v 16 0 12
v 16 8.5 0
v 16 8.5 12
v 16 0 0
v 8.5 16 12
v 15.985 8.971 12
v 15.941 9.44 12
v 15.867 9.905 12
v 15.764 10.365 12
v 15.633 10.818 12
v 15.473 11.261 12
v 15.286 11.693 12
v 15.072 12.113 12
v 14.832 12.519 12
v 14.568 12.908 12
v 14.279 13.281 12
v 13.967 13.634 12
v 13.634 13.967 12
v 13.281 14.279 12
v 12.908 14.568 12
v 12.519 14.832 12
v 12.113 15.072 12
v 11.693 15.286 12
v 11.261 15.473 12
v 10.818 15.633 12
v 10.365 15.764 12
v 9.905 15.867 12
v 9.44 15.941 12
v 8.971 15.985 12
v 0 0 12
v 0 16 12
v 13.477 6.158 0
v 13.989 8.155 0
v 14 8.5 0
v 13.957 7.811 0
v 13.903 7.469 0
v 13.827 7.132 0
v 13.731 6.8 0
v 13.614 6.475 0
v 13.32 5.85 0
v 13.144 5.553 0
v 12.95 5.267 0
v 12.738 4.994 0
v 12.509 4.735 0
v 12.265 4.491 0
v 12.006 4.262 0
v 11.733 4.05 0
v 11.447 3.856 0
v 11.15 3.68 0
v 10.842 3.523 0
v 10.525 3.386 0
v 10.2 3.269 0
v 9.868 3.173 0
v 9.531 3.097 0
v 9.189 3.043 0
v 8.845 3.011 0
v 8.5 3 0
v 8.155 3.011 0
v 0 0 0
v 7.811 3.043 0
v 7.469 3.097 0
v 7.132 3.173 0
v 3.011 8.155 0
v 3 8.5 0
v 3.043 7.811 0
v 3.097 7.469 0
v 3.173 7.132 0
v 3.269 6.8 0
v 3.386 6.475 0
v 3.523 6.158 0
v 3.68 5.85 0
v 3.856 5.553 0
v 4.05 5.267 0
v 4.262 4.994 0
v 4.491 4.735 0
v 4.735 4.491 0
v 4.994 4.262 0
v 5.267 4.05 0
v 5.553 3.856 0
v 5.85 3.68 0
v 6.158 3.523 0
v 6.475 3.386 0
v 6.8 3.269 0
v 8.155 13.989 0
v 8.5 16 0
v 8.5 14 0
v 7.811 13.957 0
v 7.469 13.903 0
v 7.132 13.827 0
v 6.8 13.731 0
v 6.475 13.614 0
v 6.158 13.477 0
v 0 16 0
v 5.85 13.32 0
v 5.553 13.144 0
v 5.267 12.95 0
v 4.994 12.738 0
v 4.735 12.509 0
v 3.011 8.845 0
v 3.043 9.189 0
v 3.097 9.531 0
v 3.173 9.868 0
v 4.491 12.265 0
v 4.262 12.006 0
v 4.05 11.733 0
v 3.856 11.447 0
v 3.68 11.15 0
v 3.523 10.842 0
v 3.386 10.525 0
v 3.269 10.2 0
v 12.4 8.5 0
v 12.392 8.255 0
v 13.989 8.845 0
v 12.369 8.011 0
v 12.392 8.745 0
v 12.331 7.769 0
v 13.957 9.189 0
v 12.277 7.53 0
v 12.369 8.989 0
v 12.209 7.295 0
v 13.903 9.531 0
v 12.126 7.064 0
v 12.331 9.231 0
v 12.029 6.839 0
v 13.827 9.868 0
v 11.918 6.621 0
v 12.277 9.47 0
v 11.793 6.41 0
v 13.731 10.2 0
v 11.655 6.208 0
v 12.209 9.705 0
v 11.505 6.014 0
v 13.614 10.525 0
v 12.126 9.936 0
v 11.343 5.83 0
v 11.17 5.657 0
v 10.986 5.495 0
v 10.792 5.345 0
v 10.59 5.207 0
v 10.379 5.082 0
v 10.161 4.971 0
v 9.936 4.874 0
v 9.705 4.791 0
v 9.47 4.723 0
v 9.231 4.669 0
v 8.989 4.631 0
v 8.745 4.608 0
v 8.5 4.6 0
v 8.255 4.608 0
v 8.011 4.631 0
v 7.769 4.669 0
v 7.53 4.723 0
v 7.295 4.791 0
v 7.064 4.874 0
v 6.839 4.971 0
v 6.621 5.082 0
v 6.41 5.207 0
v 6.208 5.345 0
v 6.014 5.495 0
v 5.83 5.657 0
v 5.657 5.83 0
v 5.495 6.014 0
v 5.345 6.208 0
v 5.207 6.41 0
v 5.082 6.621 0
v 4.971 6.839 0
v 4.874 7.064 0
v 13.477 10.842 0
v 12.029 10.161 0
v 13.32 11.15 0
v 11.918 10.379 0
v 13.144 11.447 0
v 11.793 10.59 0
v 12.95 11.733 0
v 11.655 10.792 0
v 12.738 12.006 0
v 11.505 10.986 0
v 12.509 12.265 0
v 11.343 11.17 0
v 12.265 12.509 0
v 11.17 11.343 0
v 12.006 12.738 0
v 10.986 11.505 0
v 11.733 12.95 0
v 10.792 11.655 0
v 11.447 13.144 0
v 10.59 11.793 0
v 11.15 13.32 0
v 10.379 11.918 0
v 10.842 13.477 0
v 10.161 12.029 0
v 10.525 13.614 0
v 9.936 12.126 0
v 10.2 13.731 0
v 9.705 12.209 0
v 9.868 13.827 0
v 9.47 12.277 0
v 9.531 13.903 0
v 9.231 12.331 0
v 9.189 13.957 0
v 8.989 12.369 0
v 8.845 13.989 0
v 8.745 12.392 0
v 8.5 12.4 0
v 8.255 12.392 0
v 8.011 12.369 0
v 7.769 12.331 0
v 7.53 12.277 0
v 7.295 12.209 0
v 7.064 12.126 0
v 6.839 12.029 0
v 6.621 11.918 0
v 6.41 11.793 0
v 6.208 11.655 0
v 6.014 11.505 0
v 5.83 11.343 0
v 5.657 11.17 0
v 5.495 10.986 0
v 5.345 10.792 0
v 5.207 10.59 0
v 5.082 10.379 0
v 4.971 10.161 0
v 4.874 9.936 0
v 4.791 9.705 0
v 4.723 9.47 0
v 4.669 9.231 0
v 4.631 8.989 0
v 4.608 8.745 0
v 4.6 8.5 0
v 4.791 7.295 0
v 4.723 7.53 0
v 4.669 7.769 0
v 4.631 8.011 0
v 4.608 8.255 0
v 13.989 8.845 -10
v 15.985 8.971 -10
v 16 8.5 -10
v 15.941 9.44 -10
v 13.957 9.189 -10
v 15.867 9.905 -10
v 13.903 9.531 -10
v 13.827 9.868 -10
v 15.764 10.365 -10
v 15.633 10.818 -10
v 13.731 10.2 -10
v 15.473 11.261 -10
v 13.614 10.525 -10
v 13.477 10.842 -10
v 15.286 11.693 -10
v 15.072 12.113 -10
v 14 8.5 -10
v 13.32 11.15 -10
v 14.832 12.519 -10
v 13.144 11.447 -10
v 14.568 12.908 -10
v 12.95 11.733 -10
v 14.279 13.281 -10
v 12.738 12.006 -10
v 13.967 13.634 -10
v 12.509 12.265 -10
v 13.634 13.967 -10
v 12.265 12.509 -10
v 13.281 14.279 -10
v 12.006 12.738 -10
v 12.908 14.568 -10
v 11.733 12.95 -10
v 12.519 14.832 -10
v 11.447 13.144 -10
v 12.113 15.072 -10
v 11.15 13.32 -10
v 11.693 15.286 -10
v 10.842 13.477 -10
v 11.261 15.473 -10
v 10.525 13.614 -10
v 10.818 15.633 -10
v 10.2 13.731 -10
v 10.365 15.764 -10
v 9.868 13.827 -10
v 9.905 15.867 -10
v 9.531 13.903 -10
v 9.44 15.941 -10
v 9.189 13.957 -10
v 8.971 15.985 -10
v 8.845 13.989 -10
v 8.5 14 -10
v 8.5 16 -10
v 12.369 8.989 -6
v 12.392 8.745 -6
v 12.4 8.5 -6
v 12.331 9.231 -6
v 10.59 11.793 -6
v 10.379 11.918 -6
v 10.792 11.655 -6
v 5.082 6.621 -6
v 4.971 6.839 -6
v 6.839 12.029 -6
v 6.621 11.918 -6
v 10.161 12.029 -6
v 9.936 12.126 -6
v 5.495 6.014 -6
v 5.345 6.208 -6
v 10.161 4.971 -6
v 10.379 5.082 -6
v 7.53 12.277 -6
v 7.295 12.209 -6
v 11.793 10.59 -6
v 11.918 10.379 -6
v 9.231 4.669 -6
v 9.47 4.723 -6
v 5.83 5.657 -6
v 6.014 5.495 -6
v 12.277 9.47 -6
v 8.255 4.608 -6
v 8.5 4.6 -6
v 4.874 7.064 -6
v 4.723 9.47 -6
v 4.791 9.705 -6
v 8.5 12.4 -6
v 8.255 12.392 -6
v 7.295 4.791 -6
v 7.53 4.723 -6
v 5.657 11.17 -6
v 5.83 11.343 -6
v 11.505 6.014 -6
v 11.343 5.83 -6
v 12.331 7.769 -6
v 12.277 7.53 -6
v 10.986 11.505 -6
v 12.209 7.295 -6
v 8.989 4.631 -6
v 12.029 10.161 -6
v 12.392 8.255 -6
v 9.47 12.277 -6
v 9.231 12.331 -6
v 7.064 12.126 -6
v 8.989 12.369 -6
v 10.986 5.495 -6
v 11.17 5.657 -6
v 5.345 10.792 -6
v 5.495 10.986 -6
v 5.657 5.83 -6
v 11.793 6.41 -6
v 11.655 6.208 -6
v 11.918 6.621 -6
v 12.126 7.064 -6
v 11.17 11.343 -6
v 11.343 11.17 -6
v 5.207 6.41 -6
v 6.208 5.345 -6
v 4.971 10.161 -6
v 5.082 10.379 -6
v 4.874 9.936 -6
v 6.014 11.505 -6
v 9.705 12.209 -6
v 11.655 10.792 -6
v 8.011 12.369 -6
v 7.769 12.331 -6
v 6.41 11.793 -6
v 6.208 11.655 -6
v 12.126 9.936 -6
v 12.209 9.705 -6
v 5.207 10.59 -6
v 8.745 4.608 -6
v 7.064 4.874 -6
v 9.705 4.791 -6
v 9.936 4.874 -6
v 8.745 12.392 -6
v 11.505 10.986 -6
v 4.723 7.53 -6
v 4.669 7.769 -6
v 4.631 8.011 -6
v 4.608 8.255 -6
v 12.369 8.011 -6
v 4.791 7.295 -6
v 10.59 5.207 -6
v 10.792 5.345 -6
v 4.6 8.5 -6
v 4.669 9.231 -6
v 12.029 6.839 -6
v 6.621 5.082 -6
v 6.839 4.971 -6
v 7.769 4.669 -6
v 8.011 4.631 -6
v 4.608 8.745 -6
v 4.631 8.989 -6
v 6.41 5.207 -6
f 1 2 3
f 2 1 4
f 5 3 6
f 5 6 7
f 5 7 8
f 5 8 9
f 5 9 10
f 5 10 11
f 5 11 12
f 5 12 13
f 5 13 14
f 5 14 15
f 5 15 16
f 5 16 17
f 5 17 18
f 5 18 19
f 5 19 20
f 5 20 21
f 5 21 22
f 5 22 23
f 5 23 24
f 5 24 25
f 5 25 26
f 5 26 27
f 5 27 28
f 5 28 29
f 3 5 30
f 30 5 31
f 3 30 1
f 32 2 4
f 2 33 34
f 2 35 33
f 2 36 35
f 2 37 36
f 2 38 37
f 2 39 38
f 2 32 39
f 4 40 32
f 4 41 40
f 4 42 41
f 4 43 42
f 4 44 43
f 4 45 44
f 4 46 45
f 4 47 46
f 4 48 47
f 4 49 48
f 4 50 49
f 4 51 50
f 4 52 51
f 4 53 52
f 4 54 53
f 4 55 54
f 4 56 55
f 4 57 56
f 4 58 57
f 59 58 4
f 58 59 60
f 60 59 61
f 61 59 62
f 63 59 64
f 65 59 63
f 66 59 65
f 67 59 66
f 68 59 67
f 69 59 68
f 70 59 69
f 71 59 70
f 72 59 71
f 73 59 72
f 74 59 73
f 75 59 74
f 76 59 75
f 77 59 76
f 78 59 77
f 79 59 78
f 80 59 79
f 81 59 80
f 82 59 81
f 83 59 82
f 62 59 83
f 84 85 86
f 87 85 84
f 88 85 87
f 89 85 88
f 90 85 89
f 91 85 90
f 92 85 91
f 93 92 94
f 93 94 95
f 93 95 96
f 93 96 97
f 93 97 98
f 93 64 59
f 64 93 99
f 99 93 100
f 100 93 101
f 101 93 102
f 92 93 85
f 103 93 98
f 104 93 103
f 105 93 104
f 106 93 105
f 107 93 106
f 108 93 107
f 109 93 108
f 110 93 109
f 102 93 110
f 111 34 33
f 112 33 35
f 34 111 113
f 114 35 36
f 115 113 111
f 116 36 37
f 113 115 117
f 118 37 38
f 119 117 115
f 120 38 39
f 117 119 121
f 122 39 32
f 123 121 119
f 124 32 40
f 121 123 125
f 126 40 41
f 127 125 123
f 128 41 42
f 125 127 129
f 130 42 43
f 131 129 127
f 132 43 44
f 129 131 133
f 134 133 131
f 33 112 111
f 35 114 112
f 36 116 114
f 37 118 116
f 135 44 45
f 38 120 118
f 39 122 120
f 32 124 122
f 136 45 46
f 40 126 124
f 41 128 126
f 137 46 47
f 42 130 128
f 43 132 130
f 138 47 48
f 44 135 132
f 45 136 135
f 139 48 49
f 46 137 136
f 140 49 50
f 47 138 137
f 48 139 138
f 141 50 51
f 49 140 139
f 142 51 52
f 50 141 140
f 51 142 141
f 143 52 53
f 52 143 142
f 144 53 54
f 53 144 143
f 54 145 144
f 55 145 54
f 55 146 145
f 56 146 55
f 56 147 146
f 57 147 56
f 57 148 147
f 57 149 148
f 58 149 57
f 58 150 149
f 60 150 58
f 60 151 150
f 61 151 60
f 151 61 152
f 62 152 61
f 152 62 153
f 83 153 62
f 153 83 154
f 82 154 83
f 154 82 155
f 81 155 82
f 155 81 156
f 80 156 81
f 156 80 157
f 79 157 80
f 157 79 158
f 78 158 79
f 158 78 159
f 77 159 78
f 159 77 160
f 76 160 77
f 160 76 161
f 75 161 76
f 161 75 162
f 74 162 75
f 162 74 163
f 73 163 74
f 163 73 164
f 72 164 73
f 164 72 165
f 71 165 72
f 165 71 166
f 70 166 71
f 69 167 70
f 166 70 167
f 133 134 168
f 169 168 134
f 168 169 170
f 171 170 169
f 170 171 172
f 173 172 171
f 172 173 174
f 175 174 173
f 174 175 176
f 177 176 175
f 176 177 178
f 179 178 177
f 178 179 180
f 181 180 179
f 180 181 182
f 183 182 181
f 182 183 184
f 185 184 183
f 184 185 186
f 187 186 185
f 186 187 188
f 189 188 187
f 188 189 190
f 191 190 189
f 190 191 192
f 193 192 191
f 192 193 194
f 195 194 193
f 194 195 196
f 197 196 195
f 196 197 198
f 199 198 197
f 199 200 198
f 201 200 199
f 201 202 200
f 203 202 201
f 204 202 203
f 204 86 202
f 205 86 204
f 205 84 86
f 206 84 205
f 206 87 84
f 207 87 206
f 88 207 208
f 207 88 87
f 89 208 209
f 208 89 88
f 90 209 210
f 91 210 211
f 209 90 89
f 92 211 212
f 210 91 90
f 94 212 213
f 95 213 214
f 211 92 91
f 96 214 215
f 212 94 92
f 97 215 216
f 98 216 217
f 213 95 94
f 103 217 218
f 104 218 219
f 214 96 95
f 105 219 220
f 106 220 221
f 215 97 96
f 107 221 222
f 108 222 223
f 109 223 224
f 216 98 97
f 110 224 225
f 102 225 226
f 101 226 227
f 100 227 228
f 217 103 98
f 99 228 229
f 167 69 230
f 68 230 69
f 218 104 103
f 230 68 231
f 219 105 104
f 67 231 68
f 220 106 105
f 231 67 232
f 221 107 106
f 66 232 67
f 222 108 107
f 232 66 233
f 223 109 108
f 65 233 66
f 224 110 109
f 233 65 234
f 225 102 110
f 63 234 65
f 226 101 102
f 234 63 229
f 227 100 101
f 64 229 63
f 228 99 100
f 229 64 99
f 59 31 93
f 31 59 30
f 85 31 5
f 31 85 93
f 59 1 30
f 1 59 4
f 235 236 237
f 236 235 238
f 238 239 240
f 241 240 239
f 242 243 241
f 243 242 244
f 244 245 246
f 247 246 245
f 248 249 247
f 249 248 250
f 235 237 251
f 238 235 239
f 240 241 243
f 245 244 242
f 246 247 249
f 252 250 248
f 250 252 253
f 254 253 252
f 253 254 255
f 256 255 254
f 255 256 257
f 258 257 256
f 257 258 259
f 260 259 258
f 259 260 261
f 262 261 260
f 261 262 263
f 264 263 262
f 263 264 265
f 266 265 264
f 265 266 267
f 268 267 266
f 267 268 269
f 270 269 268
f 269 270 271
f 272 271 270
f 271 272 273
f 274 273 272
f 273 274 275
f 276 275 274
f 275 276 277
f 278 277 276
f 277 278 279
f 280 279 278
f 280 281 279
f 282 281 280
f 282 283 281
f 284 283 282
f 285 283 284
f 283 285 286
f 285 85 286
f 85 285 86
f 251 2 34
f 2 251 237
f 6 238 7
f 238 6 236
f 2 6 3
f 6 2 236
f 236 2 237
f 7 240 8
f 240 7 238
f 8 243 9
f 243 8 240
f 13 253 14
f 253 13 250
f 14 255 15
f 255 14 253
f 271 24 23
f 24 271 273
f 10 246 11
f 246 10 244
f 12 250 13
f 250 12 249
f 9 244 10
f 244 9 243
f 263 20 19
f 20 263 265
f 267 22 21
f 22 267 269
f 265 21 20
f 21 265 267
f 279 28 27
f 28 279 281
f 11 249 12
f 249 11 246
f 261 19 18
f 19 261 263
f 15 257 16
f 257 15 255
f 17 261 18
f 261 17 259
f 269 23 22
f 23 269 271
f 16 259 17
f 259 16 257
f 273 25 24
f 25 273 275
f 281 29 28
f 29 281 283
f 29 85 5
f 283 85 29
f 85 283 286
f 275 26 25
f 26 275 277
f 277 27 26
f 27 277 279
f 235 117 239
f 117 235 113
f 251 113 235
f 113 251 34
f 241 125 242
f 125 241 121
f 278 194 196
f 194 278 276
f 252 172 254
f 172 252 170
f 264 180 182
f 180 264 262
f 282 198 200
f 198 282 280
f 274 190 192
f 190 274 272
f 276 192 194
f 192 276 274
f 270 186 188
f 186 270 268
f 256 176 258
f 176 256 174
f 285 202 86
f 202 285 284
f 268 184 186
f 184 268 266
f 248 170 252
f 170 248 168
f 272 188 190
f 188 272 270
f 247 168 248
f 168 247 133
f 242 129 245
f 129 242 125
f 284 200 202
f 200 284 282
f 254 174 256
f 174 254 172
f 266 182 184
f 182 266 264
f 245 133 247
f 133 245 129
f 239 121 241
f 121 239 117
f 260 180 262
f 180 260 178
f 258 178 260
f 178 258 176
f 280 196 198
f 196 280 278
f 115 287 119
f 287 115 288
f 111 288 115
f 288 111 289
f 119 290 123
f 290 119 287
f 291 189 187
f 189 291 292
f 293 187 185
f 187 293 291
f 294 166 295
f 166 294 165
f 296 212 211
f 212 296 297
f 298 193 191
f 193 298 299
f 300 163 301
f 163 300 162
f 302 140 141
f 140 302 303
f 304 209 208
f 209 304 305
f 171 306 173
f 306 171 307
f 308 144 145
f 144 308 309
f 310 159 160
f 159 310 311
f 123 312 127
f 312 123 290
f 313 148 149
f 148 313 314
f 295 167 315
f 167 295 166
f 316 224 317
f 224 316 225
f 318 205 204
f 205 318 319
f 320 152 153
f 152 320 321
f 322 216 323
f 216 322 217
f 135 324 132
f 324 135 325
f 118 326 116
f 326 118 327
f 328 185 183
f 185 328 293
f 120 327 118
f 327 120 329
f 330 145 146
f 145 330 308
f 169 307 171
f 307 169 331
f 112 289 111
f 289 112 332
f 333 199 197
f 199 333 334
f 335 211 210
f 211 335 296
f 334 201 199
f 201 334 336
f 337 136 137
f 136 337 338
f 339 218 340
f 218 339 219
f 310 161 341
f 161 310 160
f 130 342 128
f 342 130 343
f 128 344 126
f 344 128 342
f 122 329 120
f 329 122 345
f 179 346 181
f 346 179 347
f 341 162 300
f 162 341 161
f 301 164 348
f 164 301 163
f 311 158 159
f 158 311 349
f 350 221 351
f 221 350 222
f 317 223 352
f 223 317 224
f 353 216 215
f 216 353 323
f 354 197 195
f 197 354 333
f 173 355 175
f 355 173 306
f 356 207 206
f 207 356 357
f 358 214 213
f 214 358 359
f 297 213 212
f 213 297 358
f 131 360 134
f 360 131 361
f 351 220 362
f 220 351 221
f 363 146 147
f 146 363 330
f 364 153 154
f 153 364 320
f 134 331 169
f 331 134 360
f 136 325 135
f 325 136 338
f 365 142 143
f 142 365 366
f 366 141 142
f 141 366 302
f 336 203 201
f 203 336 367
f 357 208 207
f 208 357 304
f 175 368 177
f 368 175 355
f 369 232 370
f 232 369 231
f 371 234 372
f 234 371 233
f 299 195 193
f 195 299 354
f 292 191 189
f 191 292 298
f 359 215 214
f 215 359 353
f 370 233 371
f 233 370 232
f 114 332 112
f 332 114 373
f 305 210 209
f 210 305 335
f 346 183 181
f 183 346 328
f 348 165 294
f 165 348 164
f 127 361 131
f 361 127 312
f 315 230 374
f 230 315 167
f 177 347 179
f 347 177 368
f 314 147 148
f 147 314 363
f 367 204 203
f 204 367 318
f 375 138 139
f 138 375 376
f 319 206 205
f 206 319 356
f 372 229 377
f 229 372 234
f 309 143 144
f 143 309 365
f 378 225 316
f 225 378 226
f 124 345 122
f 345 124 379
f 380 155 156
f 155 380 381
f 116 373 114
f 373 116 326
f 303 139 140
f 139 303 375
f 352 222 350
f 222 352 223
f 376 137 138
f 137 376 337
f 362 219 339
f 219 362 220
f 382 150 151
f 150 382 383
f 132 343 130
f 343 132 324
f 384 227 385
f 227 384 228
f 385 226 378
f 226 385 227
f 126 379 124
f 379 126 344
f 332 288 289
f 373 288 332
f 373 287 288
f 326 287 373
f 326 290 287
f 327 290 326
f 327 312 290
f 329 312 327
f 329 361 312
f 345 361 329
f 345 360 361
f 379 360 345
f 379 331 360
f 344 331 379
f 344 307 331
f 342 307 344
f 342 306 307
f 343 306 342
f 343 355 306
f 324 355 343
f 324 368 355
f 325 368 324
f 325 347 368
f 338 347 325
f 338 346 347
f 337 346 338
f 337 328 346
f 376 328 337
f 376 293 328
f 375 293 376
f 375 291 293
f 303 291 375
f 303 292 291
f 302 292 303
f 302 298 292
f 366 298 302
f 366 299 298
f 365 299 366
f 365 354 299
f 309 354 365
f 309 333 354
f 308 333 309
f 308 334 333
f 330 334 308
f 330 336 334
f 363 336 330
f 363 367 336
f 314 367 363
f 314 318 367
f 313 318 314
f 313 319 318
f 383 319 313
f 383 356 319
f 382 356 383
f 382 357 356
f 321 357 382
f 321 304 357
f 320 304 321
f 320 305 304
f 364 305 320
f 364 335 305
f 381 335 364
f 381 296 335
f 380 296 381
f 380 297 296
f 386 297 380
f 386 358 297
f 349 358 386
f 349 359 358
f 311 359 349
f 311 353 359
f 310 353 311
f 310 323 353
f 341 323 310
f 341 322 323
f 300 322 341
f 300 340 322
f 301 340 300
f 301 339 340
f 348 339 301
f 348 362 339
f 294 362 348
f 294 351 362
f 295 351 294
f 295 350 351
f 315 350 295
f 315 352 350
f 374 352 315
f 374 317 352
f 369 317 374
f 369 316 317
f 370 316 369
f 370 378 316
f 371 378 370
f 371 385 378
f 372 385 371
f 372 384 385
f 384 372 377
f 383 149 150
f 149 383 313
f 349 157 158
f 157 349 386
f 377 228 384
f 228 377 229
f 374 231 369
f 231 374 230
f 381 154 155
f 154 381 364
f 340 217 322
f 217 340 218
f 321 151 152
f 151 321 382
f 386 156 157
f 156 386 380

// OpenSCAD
$fn=100;
cornerSize=14;
screwHoleR=8 / 2;
screwHoleDepth=6;
outerDepth=10;
outerR=screwHoleR + 1.5;
buttonClearance=12;
outerEdge=2;

module inverseCorner(r=8,h=10) {
    difference() {
        translate([0,0,0]) {
            cube([r, r, h]);
        }
        translate([0,0,-0.001]) {
            cylinder(r=r,h=h + 0.002);
        }
    }
}

//inverseCorner();


difference() {
    union() {
        cube([cornerSize + outerEdge, cornerSize + outerEdge, buttonClearance]);
        translate([cornerSize - outerR, cornerSize - outerR, -outerDepth]) {
            cube([ outerR + outerEdge, outerR + outerEdge, outerDepth]);
        }

    }
    translate([cornerSize - outerR, cornerSize - outerR, -outerDepth - 0.01]) {
        inverseCorner(r=outerR + outerEdge,h=buttonClearance + outerDepth + 0.02);
    }
    translate([cornerSize - outerR, cornerSize - outerR, -outerDepth - 0.01]) {
        cylinder(r=outerR, h=outerDepth + 0.01);
        *inverseCorner(r=outerR + outerEdge,h=buttonClearance + outerDepth + 0.02);
    }
}
translate([cornerSize - outerR, cornerSize - outerR, -screwHoleDepth]) {
    cylinder(r=screwHoleR - 0.1, h=screwHoleDepth);
}
